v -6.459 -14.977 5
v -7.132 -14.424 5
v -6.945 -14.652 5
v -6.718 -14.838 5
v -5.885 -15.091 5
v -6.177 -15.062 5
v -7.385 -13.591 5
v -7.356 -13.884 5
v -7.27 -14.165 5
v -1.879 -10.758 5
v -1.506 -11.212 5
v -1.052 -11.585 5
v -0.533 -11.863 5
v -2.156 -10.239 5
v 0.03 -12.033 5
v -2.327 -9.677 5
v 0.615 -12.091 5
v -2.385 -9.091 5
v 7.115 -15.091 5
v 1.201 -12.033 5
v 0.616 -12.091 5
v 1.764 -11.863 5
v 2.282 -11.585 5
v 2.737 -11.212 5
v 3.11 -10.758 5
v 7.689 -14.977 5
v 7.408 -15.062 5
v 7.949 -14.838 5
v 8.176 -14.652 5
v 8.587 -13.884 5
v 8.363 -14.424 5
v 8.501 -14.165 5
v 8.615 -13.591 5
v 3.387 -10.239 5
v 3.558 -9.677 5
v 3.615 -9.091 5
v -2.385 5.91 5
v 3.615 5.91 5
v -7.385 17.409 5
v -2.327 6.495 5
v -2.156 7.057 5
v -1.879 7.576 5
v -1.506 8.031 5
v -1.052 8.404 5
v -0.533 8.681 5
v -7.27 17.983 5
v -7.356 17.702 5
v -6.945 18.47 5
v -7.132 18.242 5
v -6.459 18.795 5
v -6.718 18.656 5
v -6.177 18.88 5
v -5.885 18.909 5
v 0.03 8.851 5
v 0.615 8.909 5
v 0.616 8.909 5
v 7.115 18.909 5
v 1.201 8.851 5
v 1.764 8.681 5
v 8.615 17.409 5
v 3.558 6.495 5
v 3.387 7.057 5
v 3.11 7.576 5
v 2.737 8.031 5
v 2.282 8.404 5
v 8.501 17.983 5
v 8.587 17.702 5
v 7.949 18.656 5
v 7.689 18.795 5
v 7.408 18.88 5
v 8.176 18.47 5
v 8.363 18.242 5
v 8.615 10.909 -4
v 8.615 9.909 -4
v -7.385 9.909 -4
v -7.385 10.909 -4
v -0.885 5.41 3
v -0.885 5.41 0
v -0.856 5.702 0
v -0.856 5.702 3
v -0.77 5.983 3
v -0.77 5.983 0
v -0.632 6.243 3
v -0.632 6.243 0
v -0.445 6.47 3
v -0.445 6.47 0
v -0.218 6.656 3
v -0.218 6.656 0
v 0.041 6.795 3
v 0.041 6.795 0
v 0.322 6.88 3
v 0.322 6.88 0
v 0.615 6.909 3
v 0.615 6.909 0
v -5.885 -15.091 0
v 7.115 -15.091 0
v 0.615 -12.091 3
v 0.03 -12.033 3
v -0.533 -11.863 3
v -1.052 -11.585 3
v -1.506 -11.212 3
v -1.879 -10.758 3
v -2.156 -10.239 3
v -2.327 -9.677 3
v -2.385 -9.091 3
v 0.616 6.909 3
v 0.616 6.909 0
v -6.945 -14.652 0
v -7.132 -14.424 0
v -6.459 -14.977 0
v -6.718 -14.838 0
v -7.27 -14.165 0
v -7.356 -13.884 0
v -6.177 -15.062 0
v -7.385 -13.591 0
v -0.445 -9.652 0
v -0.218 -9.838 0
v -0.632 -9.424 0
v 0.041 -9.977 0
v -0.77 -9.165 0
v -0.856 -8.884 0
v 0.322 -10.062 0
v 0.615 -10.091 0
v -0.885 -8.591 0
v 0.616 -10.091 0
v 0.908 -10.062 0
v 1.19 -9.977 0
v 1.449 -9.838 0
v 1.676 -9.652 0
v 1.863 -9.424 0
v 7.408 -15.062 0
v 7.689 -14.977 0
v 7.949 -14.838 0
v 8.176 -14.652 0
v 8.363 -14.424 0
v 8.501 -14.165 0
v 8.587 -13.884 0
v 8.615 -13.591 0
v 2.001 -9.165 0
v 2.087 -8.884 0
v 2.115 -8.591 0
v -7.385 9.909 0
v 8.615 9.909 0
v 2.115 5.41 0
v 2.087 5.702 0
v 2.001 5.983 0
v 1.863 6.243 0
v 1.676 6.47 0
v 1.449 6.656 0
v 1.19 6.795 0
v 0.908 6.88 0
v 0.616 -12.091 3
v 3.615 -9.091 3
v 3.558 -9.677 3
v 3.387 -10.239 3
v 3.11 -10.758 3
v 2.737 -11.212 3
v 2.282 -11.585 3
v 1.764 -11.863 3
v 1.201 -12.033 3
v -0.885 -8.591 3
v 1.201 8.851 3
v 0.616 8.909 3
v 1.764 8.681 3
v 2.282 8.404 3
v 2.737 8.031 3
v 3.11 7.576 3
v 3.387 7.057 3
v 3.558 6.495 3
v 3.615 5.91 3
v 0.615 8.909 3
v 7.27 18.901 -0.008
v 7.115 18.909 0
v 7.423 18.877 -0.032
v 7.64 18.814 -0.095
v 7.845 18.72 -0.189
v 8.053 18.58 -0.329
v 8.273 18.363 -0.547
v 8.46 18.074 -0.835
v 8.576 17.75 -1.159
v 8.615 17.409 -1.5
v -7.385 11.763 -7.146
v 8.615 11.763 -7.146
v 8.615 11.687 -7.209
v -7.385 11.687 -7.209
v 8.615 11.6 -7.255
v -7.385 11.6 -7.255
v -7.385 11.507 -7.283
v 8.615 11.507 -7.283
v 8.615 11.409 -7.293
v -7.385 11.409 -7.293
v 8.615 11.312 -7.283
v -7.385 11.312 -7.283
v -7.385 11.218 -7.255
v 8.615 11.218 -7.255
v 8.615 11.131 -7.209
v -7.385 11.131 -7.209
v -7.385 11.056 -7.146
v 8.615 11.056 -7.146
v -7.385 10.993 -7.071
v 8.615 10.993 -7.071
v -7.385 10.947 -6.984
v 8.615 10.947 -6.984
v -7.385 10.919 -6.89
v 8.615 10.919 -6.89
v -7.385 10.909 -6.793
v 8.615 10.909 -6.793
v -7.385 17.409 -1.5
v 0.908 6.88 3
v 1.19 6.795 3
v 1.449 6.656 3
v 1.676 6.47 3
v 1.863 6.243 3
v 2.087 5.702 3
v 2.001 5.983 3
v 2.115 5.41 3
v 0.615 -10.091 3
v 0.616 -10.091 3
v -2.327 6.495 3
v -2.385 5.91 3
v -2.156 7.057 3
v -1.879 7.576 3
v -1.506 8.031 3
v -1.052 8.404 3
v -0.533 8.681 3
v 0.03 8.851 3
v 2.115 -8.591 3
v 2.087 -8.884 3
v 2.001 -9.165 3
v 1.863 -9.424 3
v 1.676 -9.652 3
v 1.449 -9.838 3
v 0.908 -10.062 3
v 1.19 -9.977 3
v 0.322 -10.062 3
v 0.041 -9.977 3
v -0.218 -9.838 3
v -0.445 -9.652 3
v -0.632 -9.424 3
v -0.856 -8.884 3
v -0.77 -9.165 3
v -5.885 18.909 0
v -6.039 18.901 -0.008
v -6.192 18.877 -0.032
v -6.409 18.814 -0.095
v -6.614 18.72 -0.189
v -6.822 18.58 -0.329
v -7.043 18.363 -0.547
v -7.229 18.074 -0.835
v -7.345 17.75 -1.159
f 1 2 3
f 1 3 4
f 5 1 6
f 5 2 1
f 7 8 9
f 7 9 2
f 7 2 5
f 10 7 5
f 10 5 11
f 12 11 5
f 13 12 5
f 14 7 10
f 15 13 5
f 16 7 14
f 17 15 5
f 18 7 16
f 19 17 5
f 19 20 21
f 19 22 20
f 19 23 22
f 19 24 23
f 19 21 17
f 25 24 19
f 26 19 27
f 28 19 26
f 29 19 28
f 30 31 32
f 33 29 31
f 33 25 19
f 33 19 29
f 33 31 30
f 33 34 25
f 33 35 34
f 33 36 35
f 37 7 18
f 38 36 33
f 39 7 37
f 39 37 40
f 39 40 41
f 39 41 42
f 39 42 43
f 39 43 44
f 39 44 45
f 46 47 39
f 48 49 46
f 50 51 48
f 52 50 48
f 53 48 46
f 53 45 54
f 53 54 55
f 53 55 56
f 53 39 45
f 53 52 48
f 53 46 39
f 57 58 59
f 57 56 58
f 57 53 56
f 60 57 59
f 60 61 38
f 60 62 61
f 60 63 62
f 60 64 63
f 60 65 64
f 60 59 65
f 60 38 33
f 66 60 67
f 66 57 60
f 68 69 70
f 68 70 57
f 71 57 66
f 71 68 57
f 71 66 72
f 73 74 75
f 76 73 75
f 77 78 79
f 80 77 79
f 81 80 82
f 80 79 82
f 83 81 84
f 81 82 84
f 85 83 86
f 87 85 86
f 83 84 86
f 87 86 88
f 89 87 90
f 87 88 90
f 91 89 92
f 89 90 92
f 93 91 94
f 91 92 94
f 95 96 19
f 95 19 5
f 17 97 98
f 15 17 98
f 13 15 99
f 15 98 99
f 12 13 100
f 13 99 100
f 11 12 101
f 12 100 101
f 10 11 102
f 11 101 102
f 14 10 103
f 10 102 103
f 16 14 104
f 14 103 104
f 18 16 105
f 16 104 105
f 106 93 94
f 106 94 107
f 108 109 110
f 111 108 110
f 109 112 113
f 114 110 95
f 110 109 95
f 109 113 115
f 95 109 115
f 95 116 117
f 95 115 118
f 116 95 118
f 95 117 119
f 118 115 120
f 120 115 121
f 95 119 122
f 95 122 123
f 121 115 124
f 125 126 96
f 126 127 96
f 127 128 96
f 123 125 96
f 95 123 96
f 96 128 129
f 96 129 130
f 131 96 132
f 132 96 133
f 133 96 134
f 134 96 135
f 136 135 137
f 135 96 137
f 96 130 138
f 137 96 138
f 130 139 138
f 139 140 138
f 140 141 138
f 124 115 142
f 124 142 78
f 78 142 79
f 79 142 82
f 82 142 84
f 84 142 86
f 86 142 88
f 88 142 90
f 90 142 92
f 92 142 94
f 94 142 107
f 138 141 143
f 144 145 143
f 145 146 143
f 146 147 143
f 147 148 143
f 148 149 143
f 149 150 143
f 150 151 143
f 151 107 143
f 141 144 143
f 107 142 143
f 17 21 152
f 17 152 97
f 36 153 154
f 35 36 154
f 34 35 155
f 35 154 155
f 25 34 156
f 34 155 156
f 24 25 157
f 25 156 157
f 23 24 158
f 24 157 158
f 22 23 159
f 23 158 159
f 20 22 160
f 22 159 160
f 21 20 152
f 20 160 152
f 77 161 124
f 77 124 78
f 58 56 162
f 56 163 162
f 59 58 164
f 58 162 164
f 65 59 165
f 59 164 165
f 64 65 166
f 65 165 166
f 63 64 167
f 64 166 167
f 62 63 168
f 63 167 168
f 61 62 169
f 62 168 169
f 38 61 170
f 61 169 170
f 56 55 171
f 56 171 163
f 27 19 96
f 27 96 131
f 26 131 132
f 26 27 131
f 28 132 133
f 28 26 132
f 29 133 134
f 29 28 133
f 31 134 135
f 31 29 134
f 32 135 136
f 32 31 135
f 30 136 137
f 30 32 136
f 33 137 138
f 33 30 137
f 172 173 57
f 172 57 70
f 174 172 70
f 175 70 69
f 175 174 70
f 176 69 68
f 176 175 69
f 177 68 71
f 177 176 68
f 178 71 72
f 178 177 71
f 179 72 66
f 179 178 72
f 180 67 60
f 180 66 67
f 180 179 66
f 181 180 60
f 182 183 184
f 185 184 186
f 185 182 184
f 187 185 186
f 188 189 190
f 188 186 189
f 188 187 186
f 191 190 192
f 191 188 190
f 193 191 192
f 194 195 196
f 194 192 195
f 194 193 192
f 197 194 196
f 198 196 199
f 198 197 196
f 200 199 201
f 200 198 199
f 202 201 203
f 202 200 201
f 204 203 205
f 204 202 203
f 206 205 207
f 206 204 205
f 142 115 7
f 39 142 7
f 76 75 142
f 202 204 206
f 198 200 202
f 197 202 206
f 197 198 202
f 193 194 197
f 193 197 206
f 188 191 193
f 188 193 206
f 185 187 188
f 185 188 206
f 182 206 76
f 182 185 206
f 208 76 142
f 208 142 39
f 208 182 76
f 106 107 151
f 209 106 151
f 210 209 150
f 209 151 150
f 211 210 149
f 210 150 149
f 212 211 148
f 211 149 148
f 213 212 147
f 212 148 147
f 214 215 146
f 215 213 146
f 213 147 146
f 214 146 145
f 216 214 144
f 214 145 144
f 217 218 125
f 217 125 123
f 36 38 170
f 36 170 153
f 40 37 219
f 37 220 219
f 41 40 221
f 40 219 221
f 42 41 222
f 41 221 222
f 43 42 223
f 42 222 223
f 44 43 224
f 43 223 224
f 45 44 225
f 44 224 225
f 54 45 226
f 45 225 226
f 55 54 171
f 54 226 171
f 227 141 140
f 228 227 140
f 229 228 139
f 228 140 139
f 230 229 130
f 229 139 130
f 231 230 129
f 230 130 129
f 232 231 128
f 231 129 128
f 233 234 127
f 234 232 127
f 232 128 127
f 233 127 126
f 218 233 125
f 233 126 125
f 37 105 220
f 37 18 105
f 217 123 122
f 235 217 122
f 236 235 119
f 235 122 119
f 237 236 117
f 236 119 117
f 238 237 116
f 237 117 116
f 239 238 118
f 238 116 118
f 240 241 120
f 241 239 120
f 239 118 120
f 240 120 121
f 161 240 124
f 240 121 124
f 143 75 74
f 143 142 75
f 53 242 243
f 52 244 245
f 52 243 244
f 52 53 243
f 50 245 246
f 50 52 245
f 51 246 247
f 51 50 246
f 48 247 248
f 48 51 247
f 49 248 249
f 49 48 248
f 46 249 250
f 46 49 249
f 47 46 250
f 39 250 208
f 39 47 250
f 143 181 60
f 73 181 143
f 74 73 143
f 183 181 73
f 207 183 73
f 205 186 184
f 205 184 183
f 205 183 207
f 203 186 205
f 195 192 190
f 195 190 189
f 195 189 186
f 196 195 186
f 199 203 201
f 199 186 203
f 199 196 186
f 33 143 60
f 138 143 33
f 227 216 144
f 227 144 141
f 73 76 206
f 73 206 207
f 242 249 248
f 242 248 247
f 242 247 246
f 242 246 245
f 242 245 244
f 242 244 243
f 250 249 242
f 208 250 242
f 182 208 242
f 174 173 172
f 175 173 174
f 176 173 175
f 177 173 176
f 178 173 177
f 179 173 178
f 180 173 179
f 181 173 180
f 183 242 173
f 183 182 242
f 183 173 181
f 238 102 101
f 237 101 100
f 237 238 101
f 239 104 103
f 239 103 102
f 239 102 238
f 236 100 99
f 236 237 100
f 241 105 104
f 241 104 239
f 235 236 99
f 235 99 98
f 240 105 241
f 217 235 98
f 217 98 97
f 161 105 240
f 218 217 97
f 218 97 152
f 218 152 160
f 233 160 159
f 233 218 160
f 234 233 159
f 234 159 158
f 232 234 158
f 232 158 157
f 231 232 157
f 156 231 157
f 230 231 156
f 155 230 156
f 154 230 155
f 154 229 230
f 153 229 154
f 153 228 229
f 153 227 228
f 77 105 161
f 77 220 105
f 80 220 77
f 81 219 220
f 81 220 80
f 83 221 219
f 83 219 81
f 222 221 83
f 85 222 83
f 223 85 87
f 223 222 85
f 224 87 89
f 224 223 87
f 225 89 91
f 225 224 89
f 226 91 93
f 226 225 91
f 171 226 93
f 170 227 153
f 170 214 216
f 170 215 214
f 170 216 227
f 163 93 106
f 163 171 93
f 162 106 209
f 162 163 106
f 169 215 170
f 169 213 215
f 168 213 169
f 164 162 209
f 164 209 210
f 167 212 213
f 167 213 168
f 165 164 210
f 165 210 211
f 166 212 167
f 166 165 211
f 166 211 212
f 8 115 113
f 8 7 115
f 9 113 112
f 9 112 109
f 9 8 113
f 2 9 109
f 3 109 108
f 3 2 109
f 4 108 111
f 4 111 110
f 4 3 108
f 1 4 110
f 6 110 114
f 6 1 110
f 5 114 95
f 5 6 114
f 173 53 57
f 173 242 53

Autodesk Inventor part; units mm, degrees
ref_plane "YZ Plane" through (0, 0, 0) normal (1, 0, 0) x (0, 1, 0)
ref_plane "XZ Plane" through (0, 0, 0) normal (0, 1, 0) x (-1, 0, 0)
ref_plane "XY Plane" through (0, 0, 0) normal (0, 0, 1) x (1, 0, 0)
sketch "Szkic1" plane through (0, 0, 0) normal (0, 0, 1) x (1, 0, 0)
  line L0 (-7.3846, 18.9091) -> (8.6154, 18.9091)
  line L1 (8.6154, 18.9091) -> (8.6154, -15.0909)
  line L2 (8.6154, -15.0909) -> (-7.3846, -15.0909)
  line L3 (-7.3846, -15.0909) -> (-7.3846, 18.9091)
  point P0 (0, 0)
  dimension "d1" = 16
  dimension "d2" = 34
extrude "Wyciągnięcie proste1" add sketch "Szkic1" along normal blind 5
sketch "Szkic2" plane through (0, 0, 0) normal (0, 0, -1) x (-1, 0, 0)
  line L0 (-8.6154, 18.9091) -> (7.3846, 18.9091) projected
  line L1 (7.3846, 18.9091) -> (7.3846, -15.0909) projected
  line L2 (-8.6154, 18.9091) -> (7.3846, 18.9091)
  line L3 (7.3846, 18.9091) -> (7.3846, 9.9091)
  line L4 (7.3846, 9.9091) -> (-8.6154, 9.9091)
  line L5 (-8.6154, 9.9091) -> (-8.6154, 18.9091)
  point P0 (0, 0)
  dimension "d5" = 9
extrude "Wyciągnięcie proste2" add sketch "Szkic2" along normal blind 8
chamfer "Faza1" distance 8 angle 45 1 edges at (0.6154, 18.9091, -8)
sketch "Szkic3" plane through (0, 0, 5) normal (0, 0, 1) x (1, 0, 0)
  line L0 (-2.3846, 8.9091) -> (3.6154, 8.9091)
  line L1 (3.6154, 8.9091) -> (3.6154, -12.0909)
  line L2 (3.6154, -12.0909) -> (-2.3846, -12.0909)
  line L3 (-2.3846, -12.0909) -> (-2.3846, 8.9091)
  line L4 (8.6154, 18.9091) -> (-7.3846, 18.9091) projected
  line L5 (-7.3846, -15.0909) -> (8.6154, -15.0909) projected
  line L6 (8.6154, -15.0909) -> (8.6154, 18.9091) projected
  point P0 (0, 0)
  dimension "d11" = 10
  dimension "d12" = 3
  dimension "d13" = 6
  dimension "d14" = 5
extrude "Wyciągnięcie proste3" cut sketch "Szkic3" against normal blind 2
sketch "Szkic4" plane through (0, 0, 3) normal (0, 0, 1) x (1, 0, 0)
  line L0 (-0.8846, 6.9091) -> (2.1154, 6.9091)
  line L1 (2.1154, 6.9091) -> (2.1154, -10.0909)
  line L2 (2.1154, -10.0909) -> (-0.8846, -10.0909)
  line L3 (-0.8846, -10.0909) -> (-0.8846, 6.9091)
  line L4 (-2.3846, 8.9091) -> (3.6154, 8.9091) projected
  line L5 (3.6154, 8.9091) -> (3.6154, -12.0909) projected
  line L6 (3.6154, -12.0909) -> (-2.3846, -12.0909) projected
  point P0 (0, 0)
  dimension "d17" = 2
  dimension "d19" = 3
  dimension "d20" = 1.5
  dimension "d21" = 2
extrude "Wyciągnięcie proste4" cut sketch "Szkic4" against normal up to next
fillet "Zaokrąglenie1" radius 3 4 edges at (3.6154, 8.9091, 4) (-2.3846, 8.9091, 4) (-2.3846, -12.0909, 4) (3.6154, -12.0909, 4)
fillet "Zaokrąglenie2" radius 1.5 4 edges at (-0.8846, 6.9091, 1.5) (2.1154, 6.9091, 1.5) (-0.8846, -10.0909, 1.5) (2.1154, -10.0909, 1.5)
fillet "Zaokrąglenie3" radius 1.5 4 edges at (-7.3846, -15.0909, 2.5) (8.6154, -15.0909, 2.5) (8.6154, 18.9091, 2.5) (-7.3846, 18.9091, 2.5)
sketch "Szkic5" plane through (-7.3846, 9.9091, 0) normal (0, -1, 0) x (1, 0, 0)
  line L0 (0, 0) -> (0, -8) projected
  line L1 (16, 0) -> (16, -8) projected
  line L2 (0, -8) -> (16, -8)
  line L3 (16, -8) -> (16, -4)
  line L4 (16, -4) -> (0, -4)
  line L5 (0, -4) -> (0, -8)
  line L6 (14.5, 0) -> (1.5, 0) projected
  point P0 (7.3846, 0)
  dimension "d28" = 4
extrude "Wyciągnięcie proste5" cut sketch "Szkic5" against normal blind 1
fillet "Zaokrąglenie5" radius 0.5 1 edges at (0.6154, 10.9091, -8)
properties part number "Trzymacz" material "Tworzywo sztuczne ABS"
